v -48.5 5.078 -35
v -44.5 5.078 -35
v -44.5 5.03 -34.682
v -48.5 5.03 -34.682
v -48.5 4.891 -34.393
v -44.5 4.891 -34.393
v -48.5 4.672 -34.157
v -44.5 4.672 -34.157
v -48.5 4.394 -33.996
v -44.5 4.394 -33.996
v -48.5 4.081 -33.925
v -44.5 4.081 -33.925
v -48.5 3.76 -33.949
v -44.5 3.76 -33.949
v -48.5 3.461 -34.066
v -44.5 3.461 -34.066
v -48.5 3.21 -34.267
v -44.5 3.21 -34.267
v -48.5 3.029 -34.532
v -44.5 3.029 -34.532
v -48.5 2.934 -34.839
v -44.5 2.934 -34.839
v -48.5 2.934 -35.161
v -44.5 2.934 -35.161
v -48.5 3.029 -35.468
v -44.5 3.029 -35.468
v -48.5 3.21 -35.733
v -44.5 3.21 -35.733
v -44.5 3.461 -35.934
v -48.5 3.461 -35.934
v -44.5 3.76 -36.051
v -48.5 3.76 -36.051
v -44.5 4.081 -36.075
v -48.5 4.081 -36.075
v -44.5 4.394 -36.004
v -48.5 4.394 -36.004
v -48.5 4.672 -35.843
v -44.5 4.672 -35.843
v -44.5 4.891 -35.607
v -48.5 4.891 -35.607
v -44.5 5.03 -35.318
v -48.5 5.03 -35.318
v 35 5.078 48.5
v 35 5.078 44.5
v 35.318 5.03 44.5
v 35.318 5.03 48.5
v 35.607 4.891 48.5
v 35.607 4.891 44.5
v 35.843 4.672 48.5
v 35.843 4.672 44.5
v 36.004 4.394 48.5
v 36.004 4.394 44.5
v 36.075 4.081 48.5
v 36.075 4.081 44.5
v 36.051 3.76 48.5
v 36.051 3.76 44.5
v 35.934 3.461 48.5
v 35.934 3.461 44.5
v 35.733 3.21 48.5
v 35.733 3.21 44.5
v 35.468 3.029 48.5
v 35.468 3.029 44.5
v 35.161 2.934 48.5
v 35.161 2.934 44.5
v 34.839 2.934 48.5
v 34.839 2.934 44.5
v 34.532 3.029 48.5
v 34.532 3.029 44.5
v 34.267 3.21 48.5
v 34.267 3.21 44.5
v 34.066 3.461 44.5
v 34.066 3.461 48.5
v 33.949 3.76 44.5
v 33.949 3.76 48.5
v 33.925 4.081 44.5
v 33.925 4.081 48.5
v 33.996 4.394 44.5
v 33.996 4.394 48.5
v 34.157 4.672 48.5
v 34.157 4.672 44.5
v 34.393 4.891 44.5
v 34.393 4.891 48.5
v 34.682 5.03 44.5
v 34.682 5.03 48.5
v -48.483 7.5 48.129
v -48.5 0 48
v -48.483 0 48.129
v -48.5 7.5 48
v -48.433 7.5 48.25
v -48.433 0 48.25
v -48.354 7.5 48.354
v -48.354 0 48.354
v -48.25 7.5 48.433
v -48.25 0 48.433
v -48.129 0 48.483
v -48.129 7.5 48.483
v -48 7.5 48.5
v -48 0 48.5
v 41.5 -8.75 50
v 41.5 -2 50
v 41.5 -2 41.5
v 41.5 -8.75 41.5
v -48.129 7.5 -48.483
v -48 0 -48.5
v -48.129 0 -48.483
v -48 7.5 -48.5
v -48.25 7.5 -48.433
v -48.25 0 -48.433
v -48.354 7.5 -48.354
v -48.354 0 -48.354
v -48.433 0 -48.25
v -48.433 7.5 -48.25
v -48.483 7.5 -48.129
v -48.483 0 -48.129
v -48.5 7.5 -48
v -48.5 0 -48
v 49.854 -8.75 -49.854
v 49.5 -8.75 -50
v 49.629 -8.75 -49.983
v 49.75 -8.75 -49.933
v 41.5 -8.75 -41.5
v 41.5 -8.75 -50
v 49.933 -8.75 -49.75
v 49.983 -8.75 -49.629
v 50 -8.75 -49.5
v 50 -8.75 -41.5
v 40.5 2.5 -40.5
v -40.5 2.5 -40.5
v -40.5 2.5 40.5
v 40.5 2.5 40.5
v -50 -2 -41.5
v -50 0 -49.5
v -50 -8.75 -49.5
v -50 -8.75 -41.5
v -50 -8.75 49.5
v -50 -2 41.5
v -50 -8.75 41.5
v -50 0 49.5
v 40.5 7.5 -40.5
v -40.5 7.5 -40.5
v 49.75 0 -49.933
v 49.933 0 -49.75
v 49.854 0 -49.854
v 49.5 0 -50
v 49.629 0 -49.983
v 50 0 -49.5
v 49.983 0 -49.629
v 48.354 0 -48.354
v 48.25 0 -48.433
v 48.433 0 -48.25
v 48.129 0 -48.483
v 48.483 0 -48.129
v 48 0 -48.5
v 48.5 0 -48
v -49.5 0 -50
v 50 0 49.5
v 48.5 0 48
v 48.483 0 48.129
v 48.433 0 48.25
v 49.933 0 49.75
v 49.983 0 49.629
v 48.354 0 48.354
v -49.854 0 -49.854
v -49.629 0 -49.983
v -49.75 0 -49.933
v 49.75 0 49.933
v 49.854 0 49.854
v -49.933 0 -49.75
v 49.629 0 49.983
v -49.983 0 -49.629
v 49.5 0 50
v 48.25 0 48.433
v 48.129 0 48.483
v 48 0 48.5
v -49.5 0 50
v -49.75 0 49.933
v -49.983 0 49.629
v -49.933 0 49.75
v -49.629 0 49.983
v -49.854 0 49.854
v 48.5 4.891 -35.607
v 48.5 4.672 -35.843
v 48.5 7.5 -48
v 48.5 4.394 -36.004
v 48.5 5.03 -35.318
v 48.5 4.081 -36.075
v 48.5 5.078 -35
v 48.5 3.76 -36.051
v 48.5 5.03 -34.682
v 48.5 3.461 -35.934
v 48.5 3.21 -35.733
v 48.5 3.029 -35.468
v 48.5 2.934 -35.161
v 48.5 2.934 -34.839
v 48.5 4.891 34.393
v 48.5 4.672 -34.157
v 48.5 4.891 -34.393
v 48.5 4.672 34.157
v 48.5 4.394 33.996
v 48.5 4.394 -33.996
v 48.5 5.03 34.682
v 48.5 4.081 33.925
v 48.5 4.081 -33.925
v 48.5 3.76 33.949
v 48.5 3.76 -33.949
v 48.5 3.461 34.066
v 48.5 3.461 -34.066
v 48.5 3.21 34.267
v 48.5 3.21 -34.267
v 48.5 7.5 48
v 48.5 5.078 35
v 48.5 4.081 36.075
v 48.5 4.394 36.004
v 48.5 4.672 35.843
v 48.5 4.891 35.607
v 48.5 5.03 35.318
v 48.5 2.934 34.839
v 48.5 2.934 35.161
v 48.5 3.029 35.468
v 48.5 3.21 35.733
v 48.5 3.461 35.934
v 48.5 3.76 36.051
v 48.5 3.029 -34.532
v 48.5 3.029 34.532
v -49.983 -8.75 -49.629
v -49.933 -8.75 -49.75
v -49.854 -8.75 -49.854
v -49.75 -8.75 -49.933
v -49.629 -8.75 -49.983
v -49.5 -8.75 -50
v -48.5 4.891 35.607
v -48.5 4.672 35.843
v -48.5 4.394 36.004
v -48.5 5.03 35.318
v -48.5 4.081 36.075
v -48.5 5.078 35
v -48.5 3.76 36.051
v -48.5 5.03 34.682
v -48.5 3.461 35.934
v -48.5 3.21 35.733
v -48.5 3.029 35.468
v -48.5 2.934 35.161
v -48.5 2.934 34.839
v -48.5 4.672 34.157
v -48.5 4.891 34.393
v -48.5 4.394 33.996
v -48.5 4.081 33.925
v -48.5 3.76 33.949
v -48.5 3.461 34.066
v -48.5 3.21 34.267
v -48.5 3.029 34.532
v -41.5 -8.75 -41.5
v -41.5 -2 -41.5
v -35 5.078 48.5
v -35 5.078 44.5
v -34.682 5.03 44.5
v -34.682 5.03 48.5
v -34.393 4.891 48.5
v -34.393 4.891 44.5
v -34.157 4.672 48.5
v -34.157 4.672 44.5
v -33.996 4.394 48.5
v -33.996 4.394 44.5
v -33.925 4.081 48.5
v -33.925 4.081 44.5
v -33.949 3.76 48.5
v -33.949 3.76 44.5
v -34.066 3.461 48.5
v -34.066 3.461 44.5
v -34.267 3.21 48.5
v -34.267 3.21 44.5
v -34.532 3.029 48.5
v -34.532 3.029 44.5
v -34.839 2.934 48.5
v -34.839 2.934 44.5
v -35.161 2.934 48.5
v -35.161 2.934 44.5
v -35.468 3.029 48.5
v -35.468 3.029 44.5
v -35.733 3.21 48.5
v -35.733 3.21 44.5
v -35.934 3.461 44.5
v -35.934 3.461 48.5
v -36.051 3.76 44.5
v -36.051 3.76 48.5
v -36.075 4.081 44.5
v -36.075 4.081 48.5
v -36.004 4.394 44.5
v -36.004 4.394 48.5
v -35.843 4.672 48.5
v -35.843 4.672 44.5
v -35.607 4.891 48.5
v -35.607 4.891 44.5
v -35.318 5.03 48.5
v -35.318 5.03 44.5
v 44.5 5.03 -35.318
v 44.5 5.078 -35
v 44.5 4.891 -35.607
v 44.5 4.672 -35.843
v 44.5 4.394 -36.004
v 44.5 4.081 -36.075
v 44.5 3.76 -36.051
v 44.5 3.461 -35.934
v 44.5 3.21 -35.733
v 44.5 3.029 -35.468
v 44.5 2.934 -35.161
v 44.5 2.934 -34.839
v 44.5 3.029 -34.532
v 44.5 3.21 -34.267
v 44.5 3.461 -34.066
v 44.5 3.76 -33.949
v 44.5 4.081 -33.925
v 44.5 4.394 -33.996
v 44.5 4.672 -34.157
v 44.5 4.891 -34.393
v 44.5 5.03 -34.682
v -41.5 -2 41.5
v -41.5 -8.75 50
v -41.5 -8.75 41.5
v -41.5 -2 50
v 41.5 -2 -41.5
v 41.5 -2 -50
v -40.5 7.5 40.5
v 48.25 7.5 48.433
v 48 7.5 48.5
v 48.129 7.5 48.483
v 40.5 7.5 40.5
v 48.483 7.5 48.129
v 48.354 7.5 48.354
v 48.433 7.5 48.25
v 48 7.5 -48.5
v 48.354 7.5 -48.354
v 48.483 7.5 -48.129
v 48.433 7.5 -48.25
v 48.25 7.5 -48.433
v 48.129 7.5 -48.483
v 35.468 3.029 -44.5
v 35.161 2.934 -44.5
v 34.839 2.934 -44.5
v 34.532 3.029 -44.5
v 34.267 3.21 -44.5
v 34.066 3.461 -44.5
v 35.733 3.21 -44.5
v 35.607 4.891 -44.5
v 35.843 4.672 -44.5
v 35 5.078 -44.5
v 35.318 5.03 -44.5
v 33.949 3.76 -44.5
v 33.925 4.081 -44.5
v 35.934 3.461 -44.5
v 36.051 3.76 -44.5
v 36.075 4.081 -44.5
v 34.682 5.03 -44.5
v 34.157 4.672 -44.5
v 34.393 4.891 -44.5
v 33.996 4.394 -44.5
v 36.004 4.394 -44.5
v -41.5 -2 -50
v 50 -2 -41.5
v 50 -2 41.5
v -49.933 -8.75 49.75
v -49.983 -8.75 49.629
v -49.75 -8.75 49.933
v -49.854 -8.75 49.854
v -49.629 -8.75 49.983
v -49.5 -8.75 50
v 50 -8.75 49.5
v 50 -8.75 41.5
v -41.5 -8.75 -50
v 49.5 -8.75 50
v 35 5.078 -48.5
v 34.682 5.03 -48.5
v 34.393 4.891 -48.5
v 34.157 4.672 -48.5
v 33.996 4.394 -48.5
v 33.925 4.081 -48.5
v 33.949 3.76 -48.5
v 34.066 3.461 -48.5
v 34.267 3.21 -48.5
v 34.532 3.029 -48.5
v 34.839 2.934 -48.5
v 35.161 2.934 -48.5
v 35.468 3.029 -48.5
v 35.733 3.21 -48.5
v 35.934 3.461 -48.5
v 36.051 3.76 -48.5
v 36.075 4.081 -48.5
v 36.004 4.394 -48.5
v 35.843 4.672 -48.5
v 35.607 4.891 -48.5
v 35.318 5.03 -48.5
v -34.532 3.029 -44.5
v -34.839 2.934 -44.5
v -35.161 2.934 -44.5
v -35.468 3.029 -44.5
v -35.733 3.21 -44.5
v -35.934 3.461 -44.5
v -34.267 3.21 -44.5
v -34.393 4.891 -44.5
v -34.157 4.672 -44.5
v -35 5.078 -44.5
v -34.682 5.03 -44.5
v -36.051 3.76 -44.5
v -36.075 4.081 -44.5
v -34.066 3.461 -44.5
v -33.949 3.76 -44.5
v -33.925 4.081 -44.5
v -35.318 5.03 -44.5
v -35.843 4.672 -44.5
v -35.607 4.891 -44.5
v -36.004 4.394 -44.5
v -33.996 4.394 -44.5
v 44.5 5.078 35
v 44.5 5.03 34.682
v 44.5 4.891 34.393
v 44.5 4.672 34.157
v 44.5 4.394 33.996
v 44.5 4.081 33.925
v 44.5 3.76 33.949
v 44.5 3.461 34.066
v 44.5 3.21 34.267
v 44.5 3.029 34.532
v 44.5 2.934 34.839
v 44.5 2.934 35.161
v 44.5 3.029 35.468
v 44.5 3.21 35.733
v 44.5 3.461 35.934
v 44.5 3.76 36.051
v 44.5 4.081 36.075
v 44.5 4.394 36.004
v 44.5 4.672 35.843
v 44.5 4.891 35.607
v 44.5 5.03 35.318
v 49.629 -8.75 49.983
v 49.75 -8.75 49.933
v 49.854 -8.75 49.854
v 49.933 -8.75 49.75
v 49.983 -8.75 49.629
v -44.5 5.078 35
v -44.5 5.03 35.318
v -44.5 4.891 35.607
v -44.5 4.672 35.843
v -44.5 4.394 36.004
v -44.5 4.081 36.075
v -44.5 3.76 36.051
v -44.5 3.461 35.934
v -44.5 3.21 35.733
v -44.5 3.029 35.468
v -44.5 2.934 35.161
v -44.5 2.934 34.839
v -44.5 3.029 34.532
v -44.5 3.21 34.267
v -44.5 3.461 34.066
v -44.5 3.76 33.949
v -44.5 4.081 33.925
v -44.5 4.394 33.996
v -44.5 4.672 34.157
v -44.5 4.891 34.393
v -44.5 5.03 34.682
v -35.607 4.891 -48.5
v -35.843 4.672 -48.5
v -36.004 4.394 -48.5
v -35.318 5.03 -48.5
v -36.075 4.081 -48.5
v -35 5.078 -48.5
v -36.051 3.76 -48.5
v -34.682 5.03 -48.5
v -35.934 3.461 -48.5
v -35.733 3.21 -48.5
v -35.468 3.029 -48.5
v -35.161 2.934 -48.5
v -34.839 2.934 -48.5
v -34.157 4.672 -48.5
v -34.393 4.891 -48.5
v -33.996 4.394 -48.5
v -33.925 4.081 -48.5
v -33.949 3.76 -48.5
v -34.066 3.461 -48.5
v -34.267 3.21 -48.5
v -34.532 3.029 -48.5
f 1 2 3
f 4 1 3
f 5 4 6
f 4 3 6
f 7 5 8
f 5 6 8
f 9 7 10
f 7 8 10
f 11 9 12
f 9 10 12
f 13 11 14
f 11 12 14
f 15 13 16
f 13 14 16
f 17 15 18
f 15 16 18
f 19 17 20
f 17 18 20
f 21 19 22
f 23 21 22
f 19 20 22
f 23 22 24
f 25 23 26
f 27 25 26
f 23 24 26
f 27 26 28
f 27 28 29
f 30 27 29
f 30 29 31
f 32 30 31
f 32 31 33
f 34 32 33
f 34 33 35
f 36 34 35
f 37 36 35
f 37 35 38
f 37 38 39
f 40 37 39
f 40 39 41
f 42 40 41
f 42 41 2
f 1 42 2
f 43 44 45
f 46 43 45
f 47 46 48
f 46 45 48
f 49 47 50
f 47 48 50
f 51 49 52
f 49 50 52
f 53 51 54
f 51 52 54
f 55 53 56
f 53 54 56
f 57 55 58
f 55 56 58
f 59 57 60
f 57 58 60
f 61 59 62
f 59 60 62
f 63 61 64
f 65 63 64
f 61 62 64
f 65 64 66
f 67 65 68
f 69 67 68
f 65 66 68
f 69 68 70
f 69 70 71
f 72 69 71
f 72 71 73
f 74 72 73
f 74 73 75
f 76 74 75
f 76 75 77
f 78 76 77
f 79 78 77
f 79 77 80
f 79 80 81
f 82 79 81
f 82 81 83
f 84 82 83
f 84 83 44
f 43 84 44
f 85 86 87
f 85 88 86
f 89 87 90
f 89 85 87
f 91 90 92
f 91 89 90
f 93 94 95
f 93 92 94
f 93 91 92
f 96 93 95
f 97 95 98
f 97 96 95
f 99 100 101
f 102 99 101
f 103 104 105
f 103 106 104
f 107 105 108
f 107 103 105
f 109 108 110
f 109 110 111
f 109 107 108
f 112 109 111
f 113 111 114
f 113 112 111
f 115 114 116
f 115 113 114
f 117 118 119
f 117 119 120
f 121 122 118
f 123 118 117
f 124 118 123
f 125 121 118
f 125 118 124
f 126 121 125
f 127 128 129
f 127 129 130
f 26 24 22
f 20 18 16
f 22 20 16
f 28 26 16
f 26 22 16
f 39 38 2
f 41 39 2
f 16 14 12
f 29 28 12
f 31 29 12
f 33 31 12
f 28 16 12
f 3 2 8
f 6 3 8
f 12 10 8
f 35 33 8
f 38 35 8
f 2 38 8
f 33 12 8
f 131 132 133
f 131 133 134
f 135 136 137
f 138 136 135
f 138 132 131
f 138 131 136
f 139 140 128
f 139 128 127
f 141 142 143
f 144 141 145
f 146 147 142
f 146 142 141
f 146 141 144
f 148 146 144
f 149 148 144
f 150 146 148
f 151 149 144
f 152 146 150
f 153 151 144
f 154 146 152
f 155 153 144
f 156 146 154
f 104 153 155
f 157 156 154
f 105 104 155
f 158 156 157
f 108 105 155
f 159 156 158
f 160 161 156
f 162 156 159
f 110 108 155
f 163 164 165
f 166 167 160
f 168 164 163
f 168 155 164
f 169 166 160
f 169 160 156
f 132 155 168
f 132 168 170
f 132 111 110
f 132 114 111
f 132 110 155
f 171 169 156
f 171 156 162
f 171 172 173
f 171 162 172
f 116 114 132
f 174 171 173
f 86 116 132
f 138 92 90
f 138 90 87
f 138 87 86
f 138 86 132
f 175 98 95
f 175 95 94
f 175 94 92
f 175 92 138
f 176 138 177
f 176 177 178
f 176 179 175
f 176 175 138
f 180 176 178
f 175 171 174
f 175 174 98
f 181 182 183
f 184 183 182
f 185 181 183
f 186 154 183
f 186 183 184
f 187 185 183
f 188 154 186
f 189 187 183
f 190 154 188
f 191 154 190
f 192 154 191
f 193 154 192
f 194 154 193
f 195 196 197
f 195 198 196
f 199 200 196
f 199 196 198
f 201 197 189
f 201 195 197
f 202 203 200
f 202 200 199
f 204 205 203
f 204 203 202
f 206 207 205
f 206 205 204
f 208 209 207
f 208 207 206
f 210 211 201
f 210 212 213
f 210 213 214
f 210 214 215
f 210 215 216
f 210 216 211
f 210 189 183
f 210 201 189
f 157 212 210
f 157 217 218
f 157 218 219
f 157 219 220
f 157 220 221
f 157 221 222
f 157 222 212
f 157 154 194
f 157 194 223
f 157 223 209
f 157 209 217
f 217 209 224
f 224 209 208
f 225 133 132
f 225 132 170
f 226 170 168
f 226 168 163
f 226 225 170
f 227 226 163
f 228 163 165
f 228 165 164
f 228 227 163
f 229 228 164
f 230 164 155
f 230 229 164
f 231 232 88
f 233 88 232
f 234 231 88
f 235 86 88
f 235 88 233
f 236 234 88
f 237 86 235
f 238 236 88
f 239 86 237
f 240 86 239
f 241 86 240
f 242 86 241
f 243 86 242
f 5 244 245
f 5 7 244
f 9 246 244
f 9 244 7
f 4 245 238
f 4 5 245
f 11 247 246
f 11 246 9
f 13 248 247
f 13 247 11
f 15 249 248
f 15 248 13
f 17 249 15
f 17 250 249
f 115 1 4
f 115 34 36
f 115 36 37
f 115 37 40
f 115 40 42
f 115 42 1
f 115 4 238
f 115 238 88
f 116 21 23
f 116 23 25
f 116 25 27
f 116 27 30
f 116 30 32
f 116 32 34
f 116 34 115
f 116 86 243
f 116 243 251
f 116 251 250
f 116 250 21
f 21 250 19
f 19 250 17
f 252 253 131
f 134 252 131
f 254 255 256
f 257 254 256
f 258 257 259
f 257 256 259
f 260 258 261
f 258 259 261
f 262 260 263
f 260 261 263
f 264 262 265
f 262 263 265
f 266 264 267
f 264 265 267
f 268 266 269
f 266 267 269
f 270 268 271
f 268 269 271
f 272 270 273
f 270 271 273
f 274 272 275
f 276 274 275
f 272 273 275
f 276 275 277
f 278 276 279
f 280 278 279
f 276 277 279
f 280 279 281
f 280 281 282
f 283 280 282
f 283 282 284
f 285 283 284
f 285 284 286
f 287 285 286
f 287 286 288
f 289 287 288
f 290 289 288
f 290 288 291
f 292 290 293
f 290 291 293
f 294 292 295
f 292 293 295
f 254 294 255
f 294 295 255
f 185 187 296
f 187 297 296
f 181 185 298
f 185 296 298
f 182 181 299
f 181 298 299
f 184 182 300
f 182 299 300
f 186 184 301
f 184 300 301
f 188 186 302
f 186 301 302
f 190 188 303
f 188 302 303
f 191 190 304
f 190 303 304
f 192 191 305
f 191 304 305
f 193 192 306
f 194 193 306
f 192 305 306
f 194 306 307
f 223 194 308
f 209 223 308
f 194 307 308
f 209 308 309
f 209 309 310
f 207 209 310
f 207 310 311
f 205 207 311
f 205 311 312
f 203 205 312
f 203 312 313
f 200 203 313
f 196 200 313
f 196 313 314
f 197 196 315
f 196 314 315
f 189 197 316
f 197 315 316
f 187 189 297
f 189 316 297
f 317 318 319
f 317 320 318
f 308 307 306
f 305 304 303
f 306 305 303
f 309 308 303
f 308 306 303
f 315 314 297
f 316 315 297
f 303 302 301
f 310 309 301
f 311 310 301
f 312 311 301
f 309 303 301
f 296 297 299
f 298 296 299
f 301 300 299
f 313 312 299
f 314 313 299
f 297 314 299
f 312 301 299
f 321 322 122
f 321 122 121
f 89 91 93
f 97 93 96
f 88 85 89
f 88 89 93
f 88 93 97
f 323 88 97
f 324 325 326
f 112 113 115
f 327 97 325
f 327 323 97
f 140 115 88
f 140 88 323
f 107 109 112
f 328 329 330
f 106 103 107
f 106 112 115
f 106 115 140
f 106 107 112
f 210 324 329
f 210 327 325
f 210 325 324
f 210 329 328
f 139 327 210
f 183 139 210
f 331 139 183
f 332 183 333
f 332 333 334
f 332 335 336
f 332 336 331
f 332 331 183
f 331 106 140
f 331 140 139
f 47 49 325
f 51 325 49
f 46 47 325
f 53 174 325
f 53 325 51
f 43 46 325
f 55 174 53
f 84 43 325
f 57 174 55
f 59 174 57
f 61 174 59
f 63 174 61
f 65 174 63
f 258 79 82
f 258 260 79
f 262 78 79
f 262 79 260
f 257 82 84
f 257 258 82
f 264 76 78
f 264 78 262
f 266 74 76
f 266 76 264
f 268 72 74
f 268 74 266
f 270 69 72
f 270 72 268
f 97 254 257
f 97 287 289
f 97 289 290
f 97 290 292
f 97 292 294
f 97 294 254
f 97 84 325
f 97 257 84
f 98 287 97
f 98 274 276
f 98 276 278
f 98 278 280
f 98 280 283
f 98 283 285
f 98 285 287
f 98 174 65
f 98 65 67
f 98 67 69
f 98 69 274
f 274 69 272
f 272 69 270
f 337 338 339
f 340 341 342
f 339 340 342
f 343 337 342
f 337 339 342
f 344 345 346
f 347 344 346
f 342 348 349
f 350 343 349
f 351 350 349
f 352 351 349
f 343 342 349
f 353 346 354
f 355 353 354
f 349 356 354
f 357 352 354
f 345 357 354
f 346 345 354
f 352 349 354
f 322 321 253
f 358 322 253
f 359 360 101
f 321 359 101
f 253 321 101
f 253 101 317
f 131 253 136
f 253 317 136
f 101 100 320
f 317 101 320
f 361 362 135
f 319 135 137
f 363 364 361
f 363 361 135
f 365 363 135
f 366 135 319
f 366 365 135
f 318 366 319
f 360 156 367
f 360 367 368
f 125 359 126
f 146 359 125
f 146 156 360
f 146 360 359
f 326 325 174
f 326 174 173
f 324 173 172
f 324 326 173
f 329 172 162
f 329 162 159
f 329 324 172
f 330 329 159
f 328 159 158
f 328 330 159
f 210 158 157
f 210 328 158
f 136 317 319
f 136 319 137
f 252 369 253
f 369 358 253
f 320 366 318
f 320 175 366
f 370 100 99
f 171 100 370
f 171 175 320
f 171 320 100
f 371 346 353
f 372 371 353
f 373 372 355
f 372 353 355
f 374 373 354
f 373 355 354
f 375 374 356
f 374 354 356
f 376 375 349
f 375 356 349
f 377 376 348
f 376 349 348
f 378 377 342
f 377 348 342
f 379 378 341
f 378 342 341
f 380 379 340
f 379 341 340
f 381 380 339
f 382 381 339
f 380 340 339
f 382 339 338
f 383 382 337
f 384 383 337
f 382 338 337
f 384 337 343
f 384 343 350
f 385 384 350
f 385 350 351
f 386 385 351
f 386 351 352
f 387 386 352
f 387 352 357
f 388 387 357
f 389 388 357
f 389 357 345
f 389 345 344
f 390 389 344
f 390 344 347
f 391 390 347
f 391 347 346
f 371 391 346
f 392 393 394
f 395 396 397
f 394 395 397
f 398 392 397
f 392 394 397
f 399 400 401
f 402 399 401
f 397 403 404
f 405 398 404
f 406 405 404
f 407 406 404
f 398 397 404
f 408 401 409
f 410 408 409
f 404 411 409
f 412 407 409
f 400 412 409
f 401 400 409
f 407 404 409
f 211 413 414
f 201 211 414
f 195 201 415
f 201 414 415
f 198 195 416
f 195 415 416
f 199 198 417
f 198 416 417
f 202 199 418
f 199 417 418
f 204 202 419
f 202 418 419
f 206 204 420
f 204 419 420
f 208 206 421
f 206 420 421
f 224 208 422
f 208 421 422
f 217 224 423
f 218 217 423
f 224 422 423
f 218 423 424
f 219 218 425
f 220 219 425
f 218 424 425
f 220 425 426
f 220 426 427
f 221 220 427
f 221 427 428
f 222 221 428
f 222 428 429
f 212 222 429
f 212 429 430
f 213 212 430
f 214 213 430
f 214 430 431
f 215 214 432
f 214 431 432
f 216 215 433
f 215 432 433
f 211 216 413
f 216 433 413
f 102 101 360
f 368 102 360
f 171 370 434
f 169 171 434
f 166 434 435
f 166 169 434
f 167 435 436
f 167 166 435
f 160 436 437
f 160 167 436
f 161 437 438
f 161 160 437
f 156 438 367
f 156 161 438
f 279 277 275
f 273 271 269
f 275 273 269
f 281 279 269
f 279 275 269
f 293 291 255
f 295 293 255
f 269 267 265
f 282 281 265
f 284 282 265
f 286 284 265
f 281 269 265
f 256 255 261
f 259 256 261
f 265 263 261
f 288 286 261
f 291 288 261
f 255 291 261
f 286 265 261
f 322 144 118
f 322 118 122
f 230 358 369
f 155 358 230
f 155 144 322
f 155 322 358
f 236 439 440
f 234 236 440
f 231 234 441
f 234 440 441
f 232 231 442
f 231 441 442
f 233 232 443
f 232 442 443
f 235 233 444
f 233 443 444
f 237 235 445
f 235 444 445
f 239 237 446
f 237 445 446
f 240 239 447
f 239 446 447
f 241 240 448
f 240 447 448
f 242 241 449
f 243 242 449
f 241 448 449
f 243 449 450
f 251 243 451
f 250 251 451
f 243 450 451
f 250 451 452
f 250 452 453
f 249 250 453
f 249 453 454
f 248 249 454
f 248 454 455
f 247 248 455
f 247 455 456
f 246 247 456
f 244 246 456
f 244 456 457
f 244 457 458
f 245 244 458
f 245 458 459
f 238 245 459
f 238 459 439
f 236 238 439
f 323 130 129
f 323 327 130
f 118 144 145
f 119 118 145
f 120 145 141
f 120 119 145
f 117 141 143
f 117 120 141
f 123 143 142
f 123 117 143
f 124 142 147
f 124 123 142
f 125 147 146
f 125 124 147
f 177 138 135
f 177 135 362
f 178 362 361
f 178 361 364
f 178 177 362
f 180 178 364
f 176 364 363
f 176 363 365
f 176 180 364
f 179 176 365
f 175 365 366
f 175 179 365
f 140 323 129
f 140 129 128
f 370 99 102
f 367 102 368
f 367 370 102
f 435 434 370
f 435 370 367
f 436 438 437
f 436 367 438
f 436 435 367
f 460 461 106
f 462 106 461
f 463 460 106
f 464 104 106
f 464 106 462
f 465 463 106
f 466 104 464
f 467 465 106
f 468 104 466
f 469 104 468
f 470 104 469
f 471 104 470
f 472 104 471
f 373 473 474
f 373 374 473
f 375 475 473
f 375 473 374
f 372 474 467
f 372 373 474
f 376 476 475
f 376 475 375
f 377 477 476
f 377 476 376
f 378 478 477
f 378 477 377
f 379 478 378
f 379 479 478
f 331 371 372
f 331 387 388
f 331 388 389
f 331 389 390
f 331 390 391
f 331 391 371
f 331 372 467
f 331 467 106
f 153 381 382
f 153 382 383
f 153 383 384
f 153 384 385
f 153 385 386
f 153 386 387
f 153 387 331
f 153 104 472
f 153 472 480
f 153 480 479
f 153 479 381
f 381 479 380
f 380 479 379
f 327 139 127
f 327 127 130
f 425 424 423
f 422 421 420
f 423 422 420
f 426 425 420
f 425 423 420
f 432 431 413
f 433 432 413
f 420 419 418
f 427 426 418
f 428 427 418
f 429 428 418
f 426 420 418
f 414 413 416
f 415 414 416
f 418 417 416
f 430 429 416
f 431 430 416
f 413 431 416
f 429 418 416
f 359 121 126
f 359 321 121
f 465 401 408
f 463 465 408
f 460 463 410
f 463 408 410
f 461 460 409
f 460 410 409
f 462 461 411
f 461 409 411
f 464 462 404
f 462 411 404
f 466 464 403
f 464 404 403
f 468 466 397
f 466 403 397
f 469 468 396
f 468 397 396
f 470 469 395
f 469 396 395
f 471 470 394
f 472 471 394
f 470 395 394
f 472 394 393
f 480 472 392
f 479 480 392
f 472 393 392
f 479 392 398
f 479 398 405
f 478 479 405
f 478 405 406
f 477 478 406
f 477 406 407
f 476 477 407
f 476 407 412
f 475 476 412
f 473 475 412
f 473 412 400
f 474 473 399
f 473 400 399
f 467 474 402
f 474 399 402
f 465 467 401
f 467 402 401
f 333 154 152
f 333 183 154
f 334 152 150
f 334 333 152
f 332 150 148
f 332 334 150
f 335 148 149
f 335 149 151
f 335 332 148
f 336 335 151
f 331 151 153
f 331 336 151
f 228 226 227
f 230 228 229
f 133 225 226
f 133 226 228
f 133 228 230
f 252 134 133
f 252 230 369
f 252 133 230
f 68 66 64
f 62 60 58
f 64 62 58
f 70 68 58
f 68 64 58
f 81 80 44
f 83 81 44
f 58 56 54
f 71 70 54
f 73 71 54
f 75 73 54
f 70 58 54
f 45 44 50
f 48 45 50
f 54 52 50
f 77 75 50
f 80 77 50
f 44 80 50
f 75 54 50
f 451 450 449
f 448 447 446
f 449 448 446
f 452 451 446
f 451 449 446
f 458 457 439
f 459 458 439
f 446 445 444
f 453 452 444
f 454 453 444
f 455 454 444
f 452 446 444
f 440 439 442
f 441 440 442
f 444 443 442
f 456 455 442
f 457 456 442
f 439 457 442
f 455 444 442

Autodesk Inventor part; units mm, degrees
ref_plane "YZ Plane" through (0, 0, 0) normal (1, 0, 0) x (0, 1, 0)
ref_plane "XZ Plane" through (0, 0, 0) normal (0, 1, 0) x (-1, 0, 0)
sketch "Sketch1" plane through (0, 0, 0) normal (0, 1, 0) x (-1, 0, 0)
  line L0 (50, 50) -> (-50, 50)
  line L1 (-50, 50) -> (-50, -50)
  line L2 (-50, -50) -> (50, -50)
  line L3 (50, -50) -> (50, 50)
  point P0 (0, 0)
  dimension "d0" = 100
  dimension "d1" = 100
  dimension "d2" = 50
  dimension "d3" = 50
extrude "Extrusion1" add sketch "Sketch1" against normal blind 2
sketch "Sketch2" plane through (0, -2, 0) normal (0, -1, 0) x (1, 0, 0)
  line L0 (-50, 50) -> (-50, -50) projected
  line L1 (-50, 50) -> (-41.5, 50)
  line L2 (-41.5, 50) -> (-41.5, 41.5)
  line L3 (-41.5, 41.5) -> (-50, 41.5)
  line L4 (-50, 41.5) -> (-50, 50)
  line L5 (0, 0) -> (0, 12.5485) construction
  line L6 (0, 0) -> (11.2114, 0) construction
  line L7 (-50, -50) -> (-50, 50)
  line L8 (-50, -50) -> (-41.5, -50)
  line L9 (-41.5, -50) -> (-41.5, -41.5)
  line L10 (-41.5, -41.5) -> (-50, -41.5)
  line L11 (-50, -41.5) -> (-50, -50)
  line L12 (50, 50) -> (50, -50)
  line L13 (50, 50) -> (41.5, 50)
  line L14 (41.5, 50) -> (41.5, 41.5)
  line L15 (41.5, 41.5) -> (50, 41.5)
  line L16 (50, 41.5) -> (50, 50)
  line L17 (50, -50) -> (50, 50)
  line L18 (50, -50) -> (41.5, -50)
  line L19 (41.5, -50) -> (41.5, -41.5)
  line L20 (41.5, -41.5) -> (50, -41.5)
  line L21 (50, -41.5) -> (50, -50)
  dimension "d6" = 8.5
  dimension "d7" = 8.5
extrude "Extrusion2" add sketch "Sketch2" along normal blind 6.75
sketch "Sketch6" plane through (0, 0, 0) normal (0, 1, 0) x (1, 0, 0)
  line L0 (-50, 50) -> (-50, -50) projected
  line L1 (-50, -50) -> (50, -50) projected
  line L2 (50, 50) -> (-50, 50) projected
  line L3 (50, -50) -> (50, 50) projected
  line L4 (-48.5, -48.5) -> (-48.5, 48.5)
  line L5 (-48.5, 48.5) -> (48.5, 48.5)
  line L6 (48.5, 48.5) -> (48.5, -48.5)
  line L7 (48.5, -48.5) -> (-48.5, -48.5)
  line L8 (-46, 34.8675) -> (-46, -34.8675)
  line L9 (-37.725, -46) -> (37.8675, -46)
  line L10 (37.8675, 46) -> (-37.725, 46)
  line L11 (46, -32.465) -> (46, 31.195)
  line L12 (0, 0) -> (-0.6811, 0) construction
  line L13 (0, 0) -> (0, 0.5483) construction
  line L14 (-37.725, -46) -> (-46, -46)
  line L15 (-46, -46) -> (-46, -34.8675)
  line L16 (-46, 34.8675) -> (-46, 46)
  line L17 (-46, 46) -> (-37.725, 46)
  line L18 (37.8675, 46) -> (46, 46)
  line L19 (46, 46) -> (46, 31.195)
  line L20 (46, -32.465) -> (46, -46)
  line L21 (46, -46) -> (37.8675, -46)
  dimension "d80" = 1.5
  dimension "d81" = 2.5
  dimension "d161" = 2.5
  dimension "d162" = 2.5
  dimension "d173" = 2.5
extrude "Extrusion5" add sketch "Sketch6" along normal blind 7.5 contours L4 L5 L6 L7
ref_plane "Work Plane1" through (-50, 0, -50) normal (0.7071068, 0, -0.7071068) x (0, -1, 0)
fillet "Fillet3" radius 0.5 4 edges at (-50, -4.375, -50) (50, -4.375, -50) (50, -4.375, 50) (-50, -4.375, 50)
fillet "Fillet4" radius 0.5 8 edges at (46, 3.75, -46) (48.5, 3.75, -48.5) (46, 3.75, 46) (48.5, 3.75, 48.5) (-48.5, 3.75, 48.5) (-46, 3.75, 46) (-48.5, 3.75, -48.5) (-46, 3.75, -46)
sketch "Sketch16" plane through (0, 0, 0) normal (0, 1, 0) x (1, 0, 0)
  arc A0 (-45.5, 46) -> (-46, 45.5) centre (-45.5, 45.5) ccw projected
  line L0 (-46, 45.5) -> (-46, -45.5) projected
  arc A1 (-46, -45.5) -> (-45.5, -46) centre (-45.5, -45.5) ccw projected
  line L1 (-45.5, -46) -> (45.5, -46) projected
  arc A2 (45.5, -46) -> (46, -45.5) centre (45.5, -45.5) ccw projected
  line L2 (46, -45.5) -> (46, 45.5) projected
  arc A3 (46, 45.5) -> (45.5, 46) centre (45.5, 45.5) ccw projected
  line L3 (45.5, 46) -> (-45.5, 46) projected
  point P0 (0, 0)
extrude "Extrusion12" add sketch "Sketch16" along normal up to surface (7.5 mm away)
sketch "Sketch17" plane through (48, 0, -48.5) normal (0, 0, -1) x (-1, 0, 0)
  circle A0 centre (83, 4) radius 1.727 projected
  circle A1 centre (13, 4) radius 1.727 projected
  point P0 (48, 0)
hole "Hole5" at (-35, 4, -48.5) at (35, 4, -48.5) direction (0, 0, 1) diameter 2.1565 depth 4 thread size "4-40 UNC" class "2B" standard "ANSI Unified Screw Threads"
pattern_circular "Circular Pattern1" count 4 over 360 about axis through (0, -10, 0) along (0, 1, 0) of "Hole5"
sketch "Sketch18" plane through (0, 7.5, 0) normal (0, 1, 0) x (1, 0, 0)
  arc A0 (-48, 48.5) -> (-48.5, 48) centre (-48, 48) ccw projected
  line L0 (-48.5, 48) -> (-48.5, -48) projected
  arc A1 (-48.5, -48) -> (-48, -48.5) centre (-48, -48) ccw projected
  line L1 (-48, -48.5) -> (48, -48.5) projected
  arc A2 (48, -48.5) -> (48.5, -48) centre (48, -48) ccw projected
  line L2 (48.5, -48) -> (48.5, 48) projected
  arc A3 (48.5, 48) -> (48, 48.5) centre (48, 48) ccw projected
  line L3 (48, 48.5) -> (-48, 48.5) projected
  line L4 (-40.5, -40.5) -> (-40.5, 40.5)
  line L5 (-40.5, 40.5) -> (40.5, 40.5)
  line L6 (40.5, 40.5) -> (40.5, -40.5)
  line L7 (40.5, -40.5) -> (-40.5, -40.5)
  point P0 (0, 0)
  dimension "d239" = 8
extrude "Extrusion13" cut sketch "Sketch18" against normal blind 5 contours L4 L5 L6 L7
equation "\"d2\" = 0.5 * d0"
equation "\"d3\" = 0.5 * d1"
equation "\"d33\" = 0.5 * d31"
equation "\"d36\" = 0.5 * d35"
equation "\"d31\" = 5"
equation "\"d35\" = 5"
properties part number "memesat top panel in progress" material "Aluminum 6061"
